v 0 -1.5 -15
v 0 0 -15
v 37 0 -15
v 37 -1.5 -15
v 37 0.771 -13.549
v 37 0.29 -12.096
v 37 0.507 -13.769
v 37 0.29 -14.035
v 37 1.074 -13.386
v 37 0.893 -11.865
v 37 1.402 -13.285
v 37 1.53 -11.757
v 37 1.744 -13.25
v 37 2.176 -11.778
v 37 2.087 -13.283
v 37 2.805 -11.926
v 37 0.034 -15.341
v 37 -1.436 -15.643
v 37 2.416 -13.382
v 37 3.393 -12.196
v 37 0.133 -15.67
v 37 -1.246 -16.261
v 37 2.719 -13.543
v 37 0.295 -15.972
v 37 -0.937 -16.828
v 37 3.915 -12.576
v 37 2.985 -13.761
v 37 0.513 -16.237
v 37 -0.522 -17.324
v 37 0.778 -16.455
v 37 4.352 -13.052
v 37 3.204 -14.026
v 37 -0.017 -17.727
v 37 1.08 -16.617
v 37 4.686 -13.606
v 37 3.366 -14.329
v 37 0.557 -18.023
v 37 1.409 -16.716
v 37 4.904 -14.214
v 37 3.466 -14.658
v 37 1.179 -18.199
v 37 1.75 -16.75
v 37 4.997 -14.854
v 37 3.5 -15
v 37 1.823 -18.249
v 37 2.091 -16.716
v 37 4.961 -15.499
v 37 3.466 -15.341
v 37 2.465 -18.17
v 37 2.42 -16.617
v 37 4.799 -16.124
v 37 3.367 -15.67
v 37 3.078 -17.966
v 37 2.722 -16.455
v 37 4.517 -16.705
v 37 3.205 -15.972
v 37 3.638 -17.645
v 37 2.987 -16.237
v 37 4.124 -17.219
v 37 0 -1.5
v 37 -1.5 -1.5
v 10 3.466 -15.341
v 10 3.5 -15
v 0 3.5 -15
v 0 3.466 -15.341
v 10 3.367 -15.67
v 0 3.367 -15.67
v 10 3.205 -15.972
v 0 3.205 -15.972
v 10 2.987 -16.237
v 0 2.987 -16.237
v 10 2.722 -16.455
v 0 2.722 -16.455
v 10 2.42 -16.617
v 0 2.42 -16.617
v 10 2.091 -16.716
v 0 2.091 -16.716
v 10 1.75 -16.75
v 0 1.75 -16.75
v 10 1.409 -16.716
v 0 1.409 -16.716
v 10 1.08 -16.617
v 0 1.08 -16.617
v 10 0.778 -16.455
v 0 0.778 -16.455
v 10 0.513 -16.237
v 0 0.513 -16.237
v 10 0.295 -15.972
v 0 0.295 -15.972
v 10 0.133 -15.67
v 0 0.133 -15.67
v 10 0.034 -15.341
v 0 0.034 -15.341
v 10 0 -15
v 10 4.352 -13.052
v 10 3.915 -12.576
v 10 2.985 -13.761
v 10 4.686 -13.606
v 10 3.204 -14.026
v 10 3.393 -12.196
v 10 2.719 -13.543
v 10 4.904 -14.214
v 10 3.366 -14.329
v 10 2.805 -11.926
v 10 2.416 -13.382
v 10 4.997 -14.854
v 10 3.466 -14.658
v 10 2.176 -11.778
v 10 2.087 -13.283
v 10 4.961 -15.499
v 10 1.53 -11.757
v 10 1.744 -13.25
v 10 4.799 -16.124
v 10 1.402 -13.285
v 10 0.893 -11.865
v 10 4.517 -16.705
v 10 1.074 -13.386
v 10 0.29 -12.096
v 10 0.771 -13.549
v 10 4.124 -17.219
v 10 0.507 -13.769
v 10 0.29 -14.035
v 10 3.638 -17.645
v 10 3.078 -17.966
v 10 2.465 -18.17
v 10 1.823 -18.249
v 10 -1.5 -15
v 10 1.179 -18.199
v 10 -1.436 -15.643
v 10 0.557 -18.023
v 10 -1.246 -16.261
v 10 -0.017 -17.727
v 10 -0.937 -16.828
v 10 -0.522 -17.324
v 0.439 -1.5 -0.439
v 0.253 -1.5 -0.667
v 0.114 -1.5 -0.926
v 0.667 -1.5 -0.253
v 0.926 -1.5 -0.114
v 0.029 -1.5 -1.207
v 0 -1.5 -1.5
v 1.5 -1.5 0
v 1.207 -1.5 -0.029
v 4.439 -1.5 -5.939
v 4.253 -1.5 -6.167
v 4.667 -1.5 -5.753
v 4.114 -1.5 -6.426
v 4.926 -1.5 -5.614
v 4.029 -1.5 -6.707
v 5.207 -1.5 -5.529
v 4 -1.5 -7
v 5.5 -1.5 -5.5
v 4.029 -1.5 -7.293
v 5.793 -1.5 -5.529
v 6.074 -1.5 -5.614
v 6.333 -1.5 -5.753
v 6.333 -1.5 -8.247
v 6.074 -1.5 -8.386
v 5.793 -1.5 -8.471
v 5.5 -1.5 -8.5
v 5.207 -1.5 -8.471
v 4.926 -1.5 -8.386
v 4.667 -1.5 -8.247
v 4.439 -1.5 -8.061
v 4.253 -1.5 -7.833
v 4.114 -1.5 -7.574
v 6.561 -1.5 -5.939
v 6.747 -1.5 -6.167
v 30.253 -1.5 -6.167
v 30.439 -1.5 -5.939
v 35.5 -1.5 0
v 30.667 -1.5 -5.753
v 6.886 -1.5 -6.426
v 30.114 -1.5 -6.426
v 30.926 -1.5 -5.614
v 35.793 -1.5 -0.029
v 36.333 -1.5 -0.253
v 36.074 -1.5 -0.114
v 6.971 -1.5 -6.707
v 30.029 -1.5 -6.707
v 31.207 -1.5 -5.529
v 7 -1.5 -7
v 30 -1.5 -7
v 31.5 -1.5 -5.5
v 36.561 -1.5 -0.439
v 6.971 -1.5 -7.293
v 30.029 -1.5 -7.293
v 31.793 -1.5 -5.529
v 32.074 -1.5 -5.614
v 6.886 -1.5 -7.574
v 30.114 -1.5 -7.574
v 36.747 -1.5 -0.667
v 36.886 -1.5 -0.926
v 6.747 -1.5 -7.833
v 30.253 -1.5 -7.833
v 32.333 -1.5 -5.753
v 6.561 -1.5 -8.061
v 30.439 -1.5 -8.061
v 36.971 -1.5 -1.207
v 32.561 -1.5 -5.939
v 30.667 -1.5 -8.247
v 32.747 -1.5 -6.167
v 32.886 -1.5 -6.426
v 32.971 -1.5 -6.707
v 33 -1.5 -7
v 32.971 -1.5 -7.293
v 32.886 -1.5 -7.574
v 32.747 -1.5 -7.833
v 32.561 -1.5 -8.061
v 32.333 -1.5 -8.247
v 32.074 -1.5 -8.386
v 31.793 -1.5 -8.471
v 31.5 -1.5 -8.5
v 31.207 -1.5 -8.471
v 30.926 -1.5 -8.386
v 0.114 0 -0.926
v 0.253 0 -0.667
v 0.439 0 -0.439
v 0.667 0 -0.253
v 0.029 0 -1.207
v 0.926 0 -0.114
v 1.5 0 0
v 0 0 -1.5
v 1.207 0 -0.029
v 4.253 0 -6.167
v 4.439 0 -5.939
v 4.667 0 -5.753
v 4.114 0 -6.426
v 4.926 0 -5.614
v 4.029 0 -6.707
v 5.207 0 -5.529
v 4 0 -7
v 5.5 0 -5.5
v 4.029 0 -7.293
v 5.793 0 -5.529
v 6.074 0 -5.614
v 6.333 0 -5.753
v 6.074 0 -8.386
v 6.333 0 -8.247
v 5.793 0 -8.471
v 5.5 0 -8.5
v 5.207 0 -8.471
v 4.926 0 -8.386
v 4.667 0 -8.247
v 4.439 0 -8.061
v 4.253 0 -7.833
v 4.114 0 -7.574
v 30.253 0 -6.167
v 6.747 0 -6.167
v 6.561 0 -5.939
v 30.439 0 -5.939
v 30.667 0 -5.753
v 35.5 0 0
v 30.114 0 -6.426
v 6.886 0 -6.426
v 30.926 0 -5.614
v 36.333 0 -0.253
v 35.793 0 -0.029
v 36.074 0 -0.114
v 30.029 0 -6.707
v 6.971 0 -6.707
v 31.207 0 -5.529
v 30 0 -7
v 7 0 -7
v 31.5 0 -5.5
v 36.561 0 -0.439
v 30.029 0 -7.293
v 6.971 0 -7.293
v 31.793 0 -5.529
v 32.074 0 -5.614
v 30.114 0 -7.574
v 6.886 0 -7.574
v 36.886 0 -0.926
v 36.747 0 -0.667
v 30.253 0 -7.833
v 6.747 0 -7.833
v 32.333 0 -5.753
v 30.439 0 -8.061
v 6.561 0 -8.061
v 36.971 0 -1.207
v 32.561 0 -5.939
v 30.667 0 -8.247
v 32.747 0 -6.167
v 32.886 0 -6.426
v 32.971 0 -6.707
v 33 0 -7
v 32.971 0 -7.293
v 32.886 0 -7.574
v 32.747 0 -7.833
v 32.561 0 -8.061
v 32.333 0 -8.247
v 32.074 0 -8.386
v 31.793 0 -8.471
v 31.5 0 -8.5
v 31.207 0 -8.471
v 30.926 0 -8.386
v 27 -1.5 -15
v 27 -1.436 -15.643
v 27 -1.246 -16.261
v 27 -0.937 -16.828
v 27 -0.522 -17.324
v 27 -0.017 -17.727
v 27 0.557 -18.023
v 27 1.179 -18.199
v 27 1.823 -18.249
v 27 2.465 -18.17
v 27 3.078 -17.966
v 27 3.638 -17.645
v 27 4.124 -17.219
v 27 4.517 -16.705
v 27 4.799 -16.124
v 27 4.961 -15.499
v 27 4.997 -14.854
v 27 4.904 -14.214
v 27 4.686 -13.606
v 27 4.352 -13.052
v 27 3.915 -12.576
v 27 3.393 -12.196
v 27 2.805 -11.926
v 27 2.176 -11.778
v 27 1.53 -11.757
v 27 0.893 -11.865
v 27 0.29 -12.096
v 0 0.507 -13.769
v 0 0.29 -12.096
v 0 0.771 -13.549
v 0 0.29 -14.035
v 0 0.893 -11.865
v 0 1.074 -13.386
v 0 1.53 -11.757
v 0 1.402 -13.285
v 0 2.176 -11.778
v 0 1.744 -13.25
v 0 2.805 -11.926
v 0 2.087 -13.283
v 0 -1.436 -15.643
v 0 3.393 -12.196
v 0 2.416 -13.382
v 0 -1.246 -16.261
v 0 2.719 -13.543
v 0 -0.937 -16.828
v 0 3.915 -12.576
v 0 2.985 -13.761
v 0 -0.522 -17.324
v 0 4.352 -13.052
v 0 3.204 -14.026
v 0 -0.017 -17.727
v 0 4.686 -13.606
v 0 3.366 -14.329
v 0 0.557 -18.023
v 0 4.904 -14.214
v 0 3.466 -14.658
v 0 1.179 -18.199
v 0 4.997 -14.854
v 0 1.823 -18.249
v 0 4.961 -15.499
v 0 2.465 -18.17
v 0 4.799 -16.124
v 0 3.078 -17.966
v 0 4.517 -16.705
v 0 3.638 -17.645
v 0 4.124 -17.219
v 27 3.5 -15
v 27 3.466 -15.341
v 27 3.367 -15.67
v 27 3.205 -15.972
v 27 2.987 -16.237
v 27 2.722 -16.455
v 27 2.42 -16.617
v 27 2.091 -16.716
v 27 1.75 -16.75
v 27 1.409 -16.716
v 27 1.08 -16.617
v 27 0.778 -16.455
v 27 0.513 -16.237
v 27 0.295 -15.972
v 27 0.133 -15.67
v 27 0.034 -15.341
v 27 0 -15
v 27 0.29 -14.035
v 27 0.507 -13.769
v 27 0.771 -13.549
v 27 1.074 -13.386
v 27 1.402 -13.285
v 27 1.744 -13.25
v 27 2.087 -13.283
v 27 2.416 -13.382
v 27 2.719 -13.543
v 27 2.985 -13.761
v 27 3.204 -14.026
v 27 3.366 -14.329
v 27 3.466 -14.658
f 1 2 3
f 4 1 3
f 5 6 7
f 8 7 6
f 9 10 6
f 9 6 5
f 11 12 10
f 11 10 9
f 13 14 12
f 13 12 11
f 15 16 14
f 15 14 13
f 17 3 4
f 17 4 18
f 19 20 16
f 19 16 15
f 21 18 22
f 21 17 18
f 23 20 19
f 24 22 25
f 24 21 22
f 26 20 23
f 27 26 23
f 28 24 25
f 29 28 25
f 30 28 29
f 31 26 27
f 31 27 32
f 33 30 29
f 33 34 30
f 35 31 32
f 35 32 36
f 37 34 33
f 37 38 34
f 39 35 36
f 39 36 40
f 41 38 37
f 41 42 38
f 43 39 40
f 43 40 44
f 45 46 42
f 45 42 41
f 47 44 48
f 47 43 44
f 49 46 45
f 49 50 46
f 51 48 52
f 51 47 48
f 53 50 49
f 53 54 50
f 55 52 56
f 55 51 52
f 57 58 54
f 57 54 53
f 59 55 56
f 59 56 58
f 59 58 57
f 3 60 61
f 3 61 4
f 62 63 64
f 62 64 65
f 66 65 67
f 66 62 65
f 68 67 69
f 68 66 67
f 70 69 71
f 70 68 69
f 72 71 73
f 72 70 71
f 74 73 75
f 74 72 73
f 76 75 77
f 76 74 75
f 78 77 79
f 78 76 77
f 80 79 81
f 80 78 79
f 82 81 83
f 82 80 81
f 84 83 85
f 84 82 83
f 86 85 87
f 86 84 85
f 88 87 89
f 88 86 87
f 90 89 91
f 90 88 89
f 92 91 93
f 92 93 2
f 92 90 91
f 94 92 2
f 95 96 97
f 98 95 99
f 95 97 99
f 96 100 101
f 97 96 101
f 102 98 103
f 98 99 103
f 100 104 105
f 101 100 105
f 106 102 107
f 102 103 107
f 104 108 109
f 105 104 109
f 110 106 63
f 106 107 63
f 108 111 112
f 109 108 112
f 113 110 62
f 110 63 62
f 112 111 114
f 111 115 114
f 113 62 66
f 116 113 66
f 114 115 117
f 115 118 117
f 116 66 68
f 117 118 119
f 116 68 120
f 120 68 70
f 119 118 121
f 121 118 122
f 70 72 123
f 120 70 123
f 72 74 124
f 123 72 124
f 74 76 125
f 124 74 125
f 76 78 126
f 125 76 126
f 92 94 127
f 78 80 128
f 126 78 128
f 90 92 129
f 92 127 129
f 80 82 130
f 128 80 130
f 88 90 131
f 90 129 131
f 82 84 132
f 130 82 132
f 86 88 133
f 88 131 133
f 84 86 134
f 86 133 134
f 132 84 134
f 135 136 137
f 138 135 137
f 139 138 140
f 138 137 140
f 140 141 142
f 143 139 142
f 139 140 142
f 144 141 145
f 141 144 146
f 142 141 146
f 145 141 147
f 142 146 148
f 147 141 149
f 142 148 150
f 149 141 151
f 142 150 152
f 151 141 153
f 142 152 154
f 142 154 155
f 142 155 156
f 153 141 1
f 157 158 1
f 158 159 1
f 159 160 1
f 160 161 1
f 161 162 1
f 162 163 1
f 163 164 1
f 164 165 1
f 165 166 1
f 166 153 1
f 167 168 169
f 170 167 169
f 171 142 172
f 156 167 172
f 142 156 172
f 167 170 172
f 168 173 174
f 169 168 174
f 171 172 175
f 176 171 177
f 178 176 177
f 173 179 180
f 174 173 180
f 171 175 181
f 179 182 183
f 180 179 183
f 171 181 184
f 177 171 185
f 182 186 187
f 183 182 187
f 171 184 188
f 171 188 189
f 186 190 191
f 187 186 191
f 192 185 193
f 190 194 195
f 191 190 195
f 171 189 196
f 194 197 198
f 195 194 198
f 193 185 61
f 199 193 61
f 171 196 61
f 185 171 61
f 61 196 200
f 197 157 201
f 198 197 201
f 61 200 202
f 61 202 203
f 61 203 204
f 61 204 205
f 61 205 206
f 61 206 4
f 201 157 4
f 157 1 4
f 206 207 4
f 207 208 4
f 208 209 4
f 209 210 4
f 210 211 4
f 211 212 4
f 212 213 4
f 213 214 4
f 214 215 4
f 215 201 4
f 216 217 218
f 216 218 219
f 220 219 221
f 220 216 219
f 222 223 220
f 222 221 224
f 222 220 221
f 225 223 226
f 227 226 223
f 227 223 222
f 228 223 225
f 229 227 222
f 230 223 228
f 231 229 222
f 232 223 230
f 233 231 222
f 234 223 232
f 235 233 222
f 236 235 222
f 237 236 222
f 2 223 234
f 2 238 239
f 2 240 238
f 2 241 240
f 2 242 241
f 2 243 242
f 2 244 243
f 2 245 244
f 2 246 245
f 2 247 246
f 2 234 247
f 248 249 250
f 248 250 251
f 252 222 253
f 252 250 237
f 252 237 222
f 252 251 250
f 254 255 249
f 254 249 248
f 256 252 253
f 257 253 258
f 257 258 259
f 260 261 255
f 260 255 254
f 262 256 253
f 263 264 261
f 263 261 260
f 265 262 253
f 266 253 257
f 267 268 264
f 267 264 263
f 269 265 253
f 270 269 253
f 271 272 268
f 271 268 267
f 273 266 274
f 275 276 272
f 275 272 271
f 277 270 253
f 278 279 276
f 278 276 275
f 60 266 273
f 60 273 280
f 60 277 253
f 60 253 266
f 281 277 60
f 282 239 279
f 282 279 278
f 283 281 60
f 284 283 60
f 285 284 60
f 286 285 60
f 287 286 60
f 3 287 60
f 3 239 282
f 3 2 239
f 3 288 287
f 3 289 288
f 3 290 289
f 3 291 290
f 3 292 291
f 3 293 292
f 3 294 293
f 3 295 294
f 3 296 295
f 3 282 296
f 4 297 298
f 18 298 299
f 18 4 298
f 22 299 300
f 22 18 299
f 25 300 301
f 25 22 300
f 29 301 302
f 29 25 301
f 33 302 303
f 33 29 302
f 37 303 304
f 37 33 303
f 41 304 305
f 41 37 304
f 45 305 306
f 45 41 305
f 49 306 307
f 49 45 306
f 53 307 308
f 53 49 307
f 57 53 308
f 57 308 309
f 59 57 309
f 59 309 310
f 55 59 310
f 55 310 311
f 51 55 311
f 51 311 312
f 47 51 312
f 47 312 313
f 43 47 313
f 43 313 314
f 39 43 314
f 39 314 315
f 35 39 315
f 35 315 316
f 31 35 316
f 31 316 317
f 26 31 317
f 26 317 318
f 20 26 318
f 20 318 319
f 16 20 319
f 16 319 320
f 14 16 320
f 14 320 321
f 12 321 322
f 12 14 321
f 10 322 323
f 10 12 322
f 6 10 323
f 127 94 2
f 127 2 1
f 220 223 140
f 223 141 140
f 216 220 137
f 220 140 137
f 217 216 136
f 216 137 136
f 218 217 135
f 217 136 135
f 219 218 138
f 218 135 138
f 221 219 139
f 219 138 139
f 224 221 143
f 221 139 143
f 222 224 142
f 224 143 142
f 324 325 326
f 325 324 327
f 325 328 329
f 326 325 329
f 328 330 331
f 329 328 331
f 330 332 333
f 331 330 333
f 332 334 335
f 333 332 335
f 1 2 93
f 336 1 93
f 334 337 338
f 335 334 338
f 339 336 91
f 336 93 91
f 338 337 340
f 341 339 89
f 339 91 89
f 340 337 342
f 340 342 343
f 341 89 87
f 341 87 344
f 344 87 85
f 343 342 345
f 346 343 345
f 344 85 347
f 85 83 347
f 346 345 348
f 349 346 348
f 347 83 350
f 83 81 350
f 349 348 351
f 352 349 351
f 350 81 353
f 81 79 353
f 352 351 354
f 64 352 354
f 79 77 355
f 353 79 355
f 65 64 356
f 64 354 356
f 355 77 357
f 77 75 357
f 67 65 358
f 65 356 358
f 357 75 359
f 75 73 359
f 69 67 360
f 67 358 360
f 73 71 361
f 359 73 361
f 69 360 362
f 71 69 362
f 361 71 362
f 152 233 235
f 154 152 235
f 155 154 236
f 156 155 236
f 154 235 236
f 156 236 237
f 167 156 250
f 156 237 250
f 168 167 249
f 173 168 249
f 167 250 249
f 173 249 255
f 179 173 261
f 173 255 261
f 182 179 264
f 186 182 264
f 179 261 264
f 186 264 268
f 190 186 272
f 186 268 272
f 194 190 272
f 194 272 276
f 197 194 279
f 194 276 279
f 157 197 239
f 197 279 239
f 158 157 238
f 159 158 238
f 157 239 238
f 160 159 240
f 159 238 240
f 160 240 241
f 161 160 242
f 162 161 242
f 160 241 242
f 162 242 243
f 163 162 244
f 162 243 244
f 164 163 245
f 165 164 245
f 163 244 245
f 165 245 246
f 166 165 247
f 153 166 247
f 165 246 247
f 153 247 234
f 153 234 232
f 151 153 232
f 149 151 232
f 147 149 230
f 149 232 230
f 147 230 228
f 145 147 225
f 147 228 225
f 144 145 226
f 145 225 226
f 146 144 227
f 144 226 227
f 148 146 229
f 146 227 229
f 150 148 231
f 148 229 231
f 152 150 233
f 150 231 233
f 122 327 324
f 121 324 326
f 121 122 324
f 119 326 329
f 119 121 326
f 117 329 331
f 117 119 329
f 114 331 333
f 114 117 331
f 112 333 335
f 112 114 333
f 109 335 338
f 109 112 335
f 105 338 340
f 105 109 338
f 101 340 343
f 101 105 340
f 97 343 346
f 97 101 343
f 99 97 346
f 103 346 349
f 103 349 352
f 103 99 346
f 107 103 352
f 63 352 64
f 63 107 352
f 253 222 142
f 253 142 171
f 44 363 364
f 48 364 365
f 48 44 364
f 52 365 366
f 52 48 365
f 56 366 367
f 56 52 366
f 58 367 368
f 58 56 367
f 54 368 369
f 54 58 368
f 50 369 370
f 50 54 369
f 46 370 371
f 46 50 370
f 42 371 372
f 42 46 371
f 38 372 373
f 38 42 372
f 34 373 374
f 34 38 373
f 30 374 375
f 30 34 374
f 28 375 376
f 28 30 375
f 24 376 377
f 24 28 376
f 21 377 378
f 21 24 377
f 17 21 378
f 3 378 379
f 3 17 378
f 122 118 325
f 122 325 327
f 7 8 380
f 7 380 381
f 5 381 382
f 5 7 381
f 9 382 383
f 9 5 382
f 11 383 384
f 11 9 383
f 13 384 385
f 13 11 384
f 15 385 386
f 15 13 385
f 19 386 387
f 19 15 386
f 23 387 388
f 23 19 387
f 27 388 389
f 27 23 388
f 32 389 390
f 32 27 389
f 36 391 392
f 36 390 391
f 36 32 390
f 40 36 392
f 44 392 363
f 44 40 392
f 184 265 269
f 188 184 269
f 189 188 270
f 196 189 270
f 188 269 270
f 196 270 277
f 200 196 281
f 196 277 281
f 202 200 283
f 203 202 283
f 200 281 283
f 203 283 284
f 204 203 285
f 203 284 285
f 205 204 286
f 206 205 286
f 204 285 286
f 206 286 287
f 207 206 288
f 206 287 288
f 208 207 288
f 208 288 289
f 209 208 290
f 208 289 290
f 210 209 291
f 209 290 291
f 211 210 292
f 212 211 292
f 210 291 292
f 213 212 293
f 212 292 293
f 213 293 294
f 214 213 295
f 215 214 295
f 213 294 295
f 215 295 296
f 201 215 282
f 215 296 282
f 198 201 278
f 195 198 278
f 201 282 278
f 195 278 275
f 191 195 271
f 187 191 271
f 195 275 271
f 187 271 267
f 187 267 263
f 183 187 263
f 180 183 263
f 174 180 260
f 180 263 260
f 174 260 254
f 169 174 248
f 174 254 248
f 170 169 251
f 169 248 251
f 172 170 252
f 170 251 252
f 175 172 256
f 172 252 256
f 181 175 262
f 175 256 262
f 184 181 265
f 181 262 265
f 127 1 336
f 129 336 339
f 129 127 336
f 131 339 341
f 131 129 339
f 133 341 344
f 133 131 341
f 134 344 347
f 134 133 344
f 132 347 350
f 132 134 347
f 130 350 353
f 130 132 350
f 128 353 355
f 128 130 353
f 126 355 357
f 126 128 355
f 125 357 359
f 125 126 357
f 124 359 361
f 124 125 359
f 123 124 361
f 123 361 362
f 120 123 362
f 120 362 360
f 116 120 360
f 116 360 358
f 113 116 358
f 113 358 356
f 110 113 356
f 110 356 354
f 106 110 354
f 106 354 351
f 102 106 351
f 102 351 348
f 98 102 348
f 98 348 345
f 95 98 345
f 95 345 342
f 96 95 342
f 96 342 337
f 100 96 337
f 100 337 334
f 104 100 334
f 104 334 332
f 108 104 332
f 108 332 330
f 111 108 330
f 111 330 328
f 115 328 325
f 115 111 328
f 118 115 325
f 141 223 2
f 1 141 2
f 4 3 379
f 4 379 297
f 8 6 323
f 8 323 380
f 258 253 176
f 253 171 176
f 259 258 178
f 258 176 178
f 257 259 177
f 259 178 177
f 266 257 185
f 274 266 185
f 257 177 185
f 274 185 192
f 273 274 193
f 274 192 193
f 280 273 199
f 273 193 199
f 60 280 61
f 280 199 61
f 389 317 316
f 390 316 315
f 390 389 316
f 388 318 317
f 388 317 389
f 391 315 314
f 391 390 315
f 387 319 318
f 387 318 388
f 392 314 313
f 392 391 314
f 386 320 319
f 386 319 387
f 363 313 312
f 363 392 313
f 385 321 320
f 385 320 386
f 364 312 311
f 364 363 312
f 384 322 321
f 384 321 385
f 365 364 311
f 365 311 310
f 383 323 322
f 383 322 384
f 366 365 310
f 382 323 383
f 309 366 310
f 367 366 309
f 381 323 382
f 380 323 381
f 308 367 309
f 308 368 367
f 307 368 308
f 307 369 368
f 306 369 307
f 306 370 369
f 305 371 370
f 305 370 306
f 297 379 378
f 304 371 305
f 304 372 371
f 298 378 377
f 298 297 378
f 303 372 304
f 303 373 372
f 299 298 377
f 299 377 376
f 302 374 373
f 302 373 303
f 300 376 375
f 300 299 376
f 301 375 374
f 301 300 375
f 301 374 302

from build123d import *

# Parameters (mm, degrees)
SKETCH_1_W               = 37
SKETCH_1_H               = 15
SKETCH_1_R               = 1.5
SM_BASE_FLANGE_1_DEPTH   = 1.5
SM_BASE_FLANGE_2_DEPTH   = 37
CUT_EXTRUDE_2_DEPTH      = 10
CUT_EXTRUDE_2_DEPTH_BACK = 10
SKETCH_9_W               = 17
SKETCH_9_H               = 10.169597845
SKETCH_16_W              = 17
SKETCH_16_H              = 8.366120423
CUT_EXTRUDE_3_DEPTH      = 10
FILLET_2_R               = 1.5


# Sheet-metal steps are written as plain solids
with BuildPart() as part:
    # Sketch 1 → 基体-法兰1 (new body)
    with BuildSketch(Plane(origin=(0, 0, 0), x_dir=(1, 0, 0), z_dir=(0, 1, 0))):
        with Locations((18.5, 7.5)):
            Rectangle(SKETCH_1_W, SKETCH_1_H)
        with Locations(Location((5.5, 7, 0), (0, 0, 270))):
            Circle(SKETCH_1_R, mode=Mode.SUBTRACT)
        with Locations(Location((31.5, 7, 0), (0, 0, 270))):
            Circle(SKETCH_1_R, mode=Mode.SUBTRACT)
    extrude(amount=-SM_BASE_FLANGE_1_DEPTH)

    # 圆角2
    fillet_2_edges = [part.edges().sort_by_distance(p)[0] for p in [
        (37, -0.75, 0),
        (0, -0.75, 0),
    ]]
    fillet(fillet_2_edges, radius=FILLET_2_R)


with BuildPart() as body_2:
    # 草图6 → 基体-法兰2 (new body)
    with BuildSketch(Plane(origin=(37, 0, 0), x_dir=(0, 0, -1), z_dir=(1, 0, 0))):
        with BuildLine():
            Line((15, 0), (15, -1.5))
            ThreePointArc((15, -1.5), (16.705423269, 4.516592032), (12.09648589, 0.289826786))
            Line((12.09648589, 0.289826786), (14.03543057, 0.289826786))
            ThreePointArc((14.03543057, 0.289826786), (13.324022207, 2.253585582), (15, 3.5))
            ThreePointArc((15, 3.5), (16.75, 1.75), (15, 0))
        make_face()
    extrude(amount=-SM_BASE_FLANGE_2_DEPTH)

    # 草图9 → 切除-拉伸2 (cut, two sides: drawn at the far end of the back side and taken through both)
    with BuildSketch(Plane(origin=(0, 0, 0), x_dir=(1, 0, 0), z_dir=(0, 1, 0)).offset(-CUT_EXTRUDE_2_DEPTH_BACK)):
        with Locations((18.5, 20.084798923)):
            Rectangle(SKETCH_9_W, SKETCH_9_H)
    extrude(amount=CUT_EXTRUDE_2_DEPTH + CUT_EXTRUDE_2_DEPTH_BACK, mode=Mode.SUBTRACT)

    # 草图16 → 切除-拉伸3 (cut)
    with BuildSketch(Plane(origin=(0, 0, -15), x_dir=(-1, 0, 0), z_dir=(0, 0, -1))):
        with Locations((-18.5, 4.183060211)):
            Rectangle(SKETCH_16_W, SKETCH_16_H)
    extrude(amount=-CUT_EXTRUDE_3_DEPTH, mode=Mode.SUBTRACT)


with BuildPart() as cut_extrude_3_piece_1:
    # of the separate pieces the step leaves, piece 1, a body of its own (cut_extrude_3_pieces)
    add(body_2.part.solids().sort_by_distance((37, 0, -15))[0])


with BuildPart() as cut_extrude_3_piece_2:
    # of the separate pieces the step leaves, piece 2, a body of its own (cut_extrude_3_pieces)
    add(body_2.part.solids().sort_by_distance((10, 0, -15))[0])


solid = Compound([part.part, cut_extrude_3_piece_1.part, cut_extrude_3_piece_2.part])
